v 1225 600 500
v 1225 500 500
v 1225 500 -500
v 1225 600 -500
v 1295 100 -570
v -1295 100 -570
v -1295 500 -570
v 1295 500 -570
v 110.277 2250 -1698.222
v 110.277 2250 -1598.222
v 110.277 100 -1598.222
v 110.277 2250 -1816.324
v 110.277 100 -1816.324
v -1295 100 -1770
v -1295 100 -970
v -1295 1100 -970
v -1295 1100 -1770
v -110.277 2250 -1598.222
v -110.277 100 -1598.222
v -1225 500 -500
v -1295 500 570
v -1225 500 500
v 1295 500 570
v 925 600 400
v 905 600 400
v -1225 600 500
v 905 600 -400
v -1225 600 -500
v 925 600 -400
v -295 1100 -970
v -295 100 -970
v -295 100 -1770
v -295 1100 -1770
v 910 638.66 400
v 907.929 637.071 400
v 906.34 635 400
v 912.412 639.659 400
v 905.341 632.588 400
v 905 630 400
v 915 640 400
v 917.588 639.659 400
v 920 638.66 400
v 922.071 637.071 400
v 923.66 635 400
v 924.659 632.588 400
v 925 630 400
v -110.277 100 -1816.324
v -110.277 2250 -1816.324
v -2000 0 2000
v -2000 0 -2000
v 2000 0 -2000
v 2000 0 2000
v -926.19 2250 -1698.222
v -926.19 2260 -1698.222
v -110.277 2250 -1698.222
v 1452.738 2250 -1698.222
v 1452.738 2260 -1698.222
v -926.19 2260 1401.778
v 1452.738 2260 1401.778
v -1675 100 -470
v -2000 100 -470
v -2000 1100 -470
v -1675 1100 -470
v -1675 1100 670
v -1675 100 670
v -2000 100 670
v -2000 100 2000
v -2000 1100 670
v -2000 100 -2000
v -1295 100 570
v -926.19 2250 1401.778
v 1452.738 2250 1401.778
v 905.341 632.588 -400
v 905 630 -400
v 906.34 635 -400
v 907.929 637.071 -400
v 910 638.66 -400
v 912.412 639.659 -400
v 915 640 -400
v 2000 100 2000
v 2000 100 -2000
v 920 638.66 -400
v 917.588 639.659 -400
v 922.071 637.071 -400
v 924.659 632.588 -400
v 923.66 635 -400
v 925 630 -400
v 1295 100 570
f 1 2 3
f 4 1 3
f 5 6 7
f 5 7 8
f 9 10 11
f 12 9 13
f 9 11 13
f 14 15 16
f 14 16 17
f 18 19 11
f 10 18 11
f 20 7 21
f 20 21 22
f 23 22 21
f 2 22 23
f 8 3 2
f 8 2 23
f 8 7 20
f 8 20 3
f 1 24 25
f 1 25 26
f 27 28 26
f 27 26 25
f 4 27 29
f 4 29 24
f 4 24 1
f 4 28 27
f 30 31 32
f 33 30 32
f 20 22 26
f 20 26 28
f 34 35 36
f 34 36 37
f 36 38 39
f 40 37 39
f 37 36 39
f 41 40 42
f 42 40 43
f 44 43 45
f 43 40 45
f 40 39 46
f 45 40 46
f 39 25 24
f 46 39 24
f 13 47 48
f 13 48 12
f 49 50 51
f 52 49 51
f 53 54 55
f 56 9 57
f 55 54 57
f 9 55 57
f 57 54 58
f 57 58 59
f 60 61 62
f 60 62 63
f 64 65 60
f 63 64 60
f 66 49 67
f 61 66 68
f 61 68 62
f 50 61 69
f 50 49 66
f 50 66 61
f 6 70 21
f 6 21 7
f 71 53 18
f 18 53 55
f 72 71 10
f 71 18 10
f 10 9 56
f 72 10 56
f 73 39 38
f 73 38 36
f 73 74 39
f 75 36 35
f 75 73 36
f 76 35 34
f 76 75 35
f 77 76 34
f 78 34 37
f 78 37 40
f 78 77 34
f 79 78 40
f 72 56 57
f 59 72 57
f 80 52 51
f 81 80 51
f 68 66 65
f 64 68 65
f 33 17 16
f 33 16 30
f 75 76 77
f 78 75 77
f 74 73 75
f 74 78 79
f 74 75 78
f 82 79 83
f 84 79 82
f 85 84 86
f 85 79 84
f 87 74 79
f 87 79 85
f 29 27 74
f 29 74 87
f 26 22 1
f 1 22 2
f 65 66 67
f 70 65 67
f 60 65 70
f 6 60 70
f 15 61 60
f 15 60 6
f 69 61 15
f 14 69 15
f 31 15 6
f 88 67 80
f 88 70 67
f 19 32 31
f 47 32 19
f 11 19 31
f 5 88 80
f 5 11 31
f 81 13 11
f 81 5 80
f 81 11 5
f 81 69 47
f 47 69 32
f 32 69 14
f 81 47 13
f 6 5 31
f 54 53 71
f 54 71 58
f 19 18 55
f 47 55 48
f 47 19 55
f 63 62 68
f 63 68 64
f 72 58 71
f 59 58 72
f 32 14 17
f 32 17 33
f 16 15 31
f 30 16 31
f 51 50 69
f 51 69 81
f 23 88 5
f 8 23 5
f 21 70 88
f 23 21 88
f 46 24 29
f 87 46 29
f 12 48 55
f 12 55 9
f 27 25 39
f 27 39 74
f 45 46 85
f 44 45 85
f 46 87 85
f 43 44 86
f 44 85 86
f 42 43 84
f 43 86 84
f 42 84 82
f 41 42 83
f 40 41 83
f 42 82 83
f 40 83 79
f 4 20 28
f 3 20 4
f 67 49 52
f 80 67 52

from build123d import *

# Parameters (mm, degrees)
SKETCH1_W                = 4000
SKETCH1_H                = 4000
BOSS_EXTRUDE1_DEPTH      = 100
SKETCH2_W                = 2590
SKETCH2_H                = 1140
BOSS_EXTRUDE2_DEPTH      = 400
SKETCH3_W                = 2450
SKETCH3_H                = 1000
BOSS_EXTRUDE3_DEPTH      = 100
SKETCH4_W                = 1000
SKETCH4_H                = 800
SKETCH4_W_2              = 325
SKETCH4_H_2              = 1140
BOSS_EXTRUDE4_DEPTH      = 1000
SKETCH5_W                = 220.553052424
SKETCH5_H                = 218.102085328
BOSS_EXTRUDE5_DEPTH      = 2150
BOSS_EXTRUDE6_DEPTH      = 3000
BOSS_EXTRUDE6_DEPTH_BACK = 100
SKETCH6_W                = 2378.927803787
SKETCH6_H                = 10
SKETCH7_W                = 20
SKETCH7_H                = 800
BOSS_EXTRUDE7_DEPTH      = 40
FILLET1_R                = 10


with BuildPart() as part:
    # Sketch1 → Boss-Extrude1 (new body)
    with BuildSketch(Plane(origin=(0, 0, 0), x_dir=(1, 0, 0), z_dir=(0, 1, 0))):
        Rectangle(SKETCH1_W, SKETCH1_H)
    extrude(amount=BOSS_EXTRUDE1_DEPTH)

    # Sketch2 → Boss-Extrude2 (add)
    with BuildSketch(Plane(origin=(0, 100, 0), x_dir=(1, 0, 0), z_dir=(0, 1, 0))):
        Rectangle(SKETCH2_W, SKETCH2_H)
    extrude(amount=BOSS_EXTRUDE2_DEPTH)

    # Sketch3 → Boss-Extrude3 (add)
    with BuildSketch(Plane(origin=(0, 500, 0), x_dir=(1, 0, 0), z_dir=(0, 1, 0))):
        Rectangle(SKETCH3_W, SKETCH3_H)
    extrude(amount=BOSS_EXTRUDE3_DEPTH)

    # Sketch4 → Boss-Extrude4 (add)
    with BuildSketch(Plane(origin=(0, 100, 0), x_dir=(1, 0, 0), z_dir=(0, 1, 0))):
        with Locations((-795, 1370)):
            Rectangle(SKETCH4_W, SKETCH4_H)
        with Locations((-1837.5, -100)):
            Rectangle(SKETCH4_W_2, SKETCH4_H_2)
    extrude(amount=BOSS_EXTRUDE4_DEPTH)

    # Sketch5 → Boss-Extrude5 (add)
    with BuildSketch(Plane(origin=(0, 100, 0), x_dir=(1, 0, 0), z_dir=(0, 1, 0))):
        with Locations((0, 1707.273154618)):
            Rectangle(SKETCH5_W, SKETCH5_H)
    extrude(amount=BOSS_EXTRUDE5_DEPTH)

    # Sketch6 → Boss-Extrude6 (add, two sides: drawn at the far end of the back side and taken through both)
    with BuildSketch(Plane.XY.offset(-1598.222111954).offset(-BOSS_EXTRUDE6_DEPTH_BACK)):
        with Locations((263.274031351, 2255)):
            Rectangle(SKETCH6_W, SKETCH6_H)
    extrude(amount=BOSS_EXTRUDE6_DEPTH + BOSS_EXTRUDE6_DEPTH_BACK)

    # Sketch7 → Boss-Extrude7 (add)
    with BuildSketch(Plane(origin=(0, 600, 0), x_dir=(1, 0, 0), z_dir=(0, 1, 0))):
        with Locations((915, 0)):
            Rectangle(SKETCH7_W, SKETCH7_H)
    extrude(amount=BOSS_EXTRUDE7_DEPTH)

    # Fillet1
    fillet1_edges = [part.edges().sort_by_distance(p)[0] for p in [
        (925, 640, 0),
        (905, 640, 0),
    ]]
    fillet(fillet1_edges, radius=FILLET1_R - 0.0001)  # a hair under: the kernel refuses the full size


solid = part.part
